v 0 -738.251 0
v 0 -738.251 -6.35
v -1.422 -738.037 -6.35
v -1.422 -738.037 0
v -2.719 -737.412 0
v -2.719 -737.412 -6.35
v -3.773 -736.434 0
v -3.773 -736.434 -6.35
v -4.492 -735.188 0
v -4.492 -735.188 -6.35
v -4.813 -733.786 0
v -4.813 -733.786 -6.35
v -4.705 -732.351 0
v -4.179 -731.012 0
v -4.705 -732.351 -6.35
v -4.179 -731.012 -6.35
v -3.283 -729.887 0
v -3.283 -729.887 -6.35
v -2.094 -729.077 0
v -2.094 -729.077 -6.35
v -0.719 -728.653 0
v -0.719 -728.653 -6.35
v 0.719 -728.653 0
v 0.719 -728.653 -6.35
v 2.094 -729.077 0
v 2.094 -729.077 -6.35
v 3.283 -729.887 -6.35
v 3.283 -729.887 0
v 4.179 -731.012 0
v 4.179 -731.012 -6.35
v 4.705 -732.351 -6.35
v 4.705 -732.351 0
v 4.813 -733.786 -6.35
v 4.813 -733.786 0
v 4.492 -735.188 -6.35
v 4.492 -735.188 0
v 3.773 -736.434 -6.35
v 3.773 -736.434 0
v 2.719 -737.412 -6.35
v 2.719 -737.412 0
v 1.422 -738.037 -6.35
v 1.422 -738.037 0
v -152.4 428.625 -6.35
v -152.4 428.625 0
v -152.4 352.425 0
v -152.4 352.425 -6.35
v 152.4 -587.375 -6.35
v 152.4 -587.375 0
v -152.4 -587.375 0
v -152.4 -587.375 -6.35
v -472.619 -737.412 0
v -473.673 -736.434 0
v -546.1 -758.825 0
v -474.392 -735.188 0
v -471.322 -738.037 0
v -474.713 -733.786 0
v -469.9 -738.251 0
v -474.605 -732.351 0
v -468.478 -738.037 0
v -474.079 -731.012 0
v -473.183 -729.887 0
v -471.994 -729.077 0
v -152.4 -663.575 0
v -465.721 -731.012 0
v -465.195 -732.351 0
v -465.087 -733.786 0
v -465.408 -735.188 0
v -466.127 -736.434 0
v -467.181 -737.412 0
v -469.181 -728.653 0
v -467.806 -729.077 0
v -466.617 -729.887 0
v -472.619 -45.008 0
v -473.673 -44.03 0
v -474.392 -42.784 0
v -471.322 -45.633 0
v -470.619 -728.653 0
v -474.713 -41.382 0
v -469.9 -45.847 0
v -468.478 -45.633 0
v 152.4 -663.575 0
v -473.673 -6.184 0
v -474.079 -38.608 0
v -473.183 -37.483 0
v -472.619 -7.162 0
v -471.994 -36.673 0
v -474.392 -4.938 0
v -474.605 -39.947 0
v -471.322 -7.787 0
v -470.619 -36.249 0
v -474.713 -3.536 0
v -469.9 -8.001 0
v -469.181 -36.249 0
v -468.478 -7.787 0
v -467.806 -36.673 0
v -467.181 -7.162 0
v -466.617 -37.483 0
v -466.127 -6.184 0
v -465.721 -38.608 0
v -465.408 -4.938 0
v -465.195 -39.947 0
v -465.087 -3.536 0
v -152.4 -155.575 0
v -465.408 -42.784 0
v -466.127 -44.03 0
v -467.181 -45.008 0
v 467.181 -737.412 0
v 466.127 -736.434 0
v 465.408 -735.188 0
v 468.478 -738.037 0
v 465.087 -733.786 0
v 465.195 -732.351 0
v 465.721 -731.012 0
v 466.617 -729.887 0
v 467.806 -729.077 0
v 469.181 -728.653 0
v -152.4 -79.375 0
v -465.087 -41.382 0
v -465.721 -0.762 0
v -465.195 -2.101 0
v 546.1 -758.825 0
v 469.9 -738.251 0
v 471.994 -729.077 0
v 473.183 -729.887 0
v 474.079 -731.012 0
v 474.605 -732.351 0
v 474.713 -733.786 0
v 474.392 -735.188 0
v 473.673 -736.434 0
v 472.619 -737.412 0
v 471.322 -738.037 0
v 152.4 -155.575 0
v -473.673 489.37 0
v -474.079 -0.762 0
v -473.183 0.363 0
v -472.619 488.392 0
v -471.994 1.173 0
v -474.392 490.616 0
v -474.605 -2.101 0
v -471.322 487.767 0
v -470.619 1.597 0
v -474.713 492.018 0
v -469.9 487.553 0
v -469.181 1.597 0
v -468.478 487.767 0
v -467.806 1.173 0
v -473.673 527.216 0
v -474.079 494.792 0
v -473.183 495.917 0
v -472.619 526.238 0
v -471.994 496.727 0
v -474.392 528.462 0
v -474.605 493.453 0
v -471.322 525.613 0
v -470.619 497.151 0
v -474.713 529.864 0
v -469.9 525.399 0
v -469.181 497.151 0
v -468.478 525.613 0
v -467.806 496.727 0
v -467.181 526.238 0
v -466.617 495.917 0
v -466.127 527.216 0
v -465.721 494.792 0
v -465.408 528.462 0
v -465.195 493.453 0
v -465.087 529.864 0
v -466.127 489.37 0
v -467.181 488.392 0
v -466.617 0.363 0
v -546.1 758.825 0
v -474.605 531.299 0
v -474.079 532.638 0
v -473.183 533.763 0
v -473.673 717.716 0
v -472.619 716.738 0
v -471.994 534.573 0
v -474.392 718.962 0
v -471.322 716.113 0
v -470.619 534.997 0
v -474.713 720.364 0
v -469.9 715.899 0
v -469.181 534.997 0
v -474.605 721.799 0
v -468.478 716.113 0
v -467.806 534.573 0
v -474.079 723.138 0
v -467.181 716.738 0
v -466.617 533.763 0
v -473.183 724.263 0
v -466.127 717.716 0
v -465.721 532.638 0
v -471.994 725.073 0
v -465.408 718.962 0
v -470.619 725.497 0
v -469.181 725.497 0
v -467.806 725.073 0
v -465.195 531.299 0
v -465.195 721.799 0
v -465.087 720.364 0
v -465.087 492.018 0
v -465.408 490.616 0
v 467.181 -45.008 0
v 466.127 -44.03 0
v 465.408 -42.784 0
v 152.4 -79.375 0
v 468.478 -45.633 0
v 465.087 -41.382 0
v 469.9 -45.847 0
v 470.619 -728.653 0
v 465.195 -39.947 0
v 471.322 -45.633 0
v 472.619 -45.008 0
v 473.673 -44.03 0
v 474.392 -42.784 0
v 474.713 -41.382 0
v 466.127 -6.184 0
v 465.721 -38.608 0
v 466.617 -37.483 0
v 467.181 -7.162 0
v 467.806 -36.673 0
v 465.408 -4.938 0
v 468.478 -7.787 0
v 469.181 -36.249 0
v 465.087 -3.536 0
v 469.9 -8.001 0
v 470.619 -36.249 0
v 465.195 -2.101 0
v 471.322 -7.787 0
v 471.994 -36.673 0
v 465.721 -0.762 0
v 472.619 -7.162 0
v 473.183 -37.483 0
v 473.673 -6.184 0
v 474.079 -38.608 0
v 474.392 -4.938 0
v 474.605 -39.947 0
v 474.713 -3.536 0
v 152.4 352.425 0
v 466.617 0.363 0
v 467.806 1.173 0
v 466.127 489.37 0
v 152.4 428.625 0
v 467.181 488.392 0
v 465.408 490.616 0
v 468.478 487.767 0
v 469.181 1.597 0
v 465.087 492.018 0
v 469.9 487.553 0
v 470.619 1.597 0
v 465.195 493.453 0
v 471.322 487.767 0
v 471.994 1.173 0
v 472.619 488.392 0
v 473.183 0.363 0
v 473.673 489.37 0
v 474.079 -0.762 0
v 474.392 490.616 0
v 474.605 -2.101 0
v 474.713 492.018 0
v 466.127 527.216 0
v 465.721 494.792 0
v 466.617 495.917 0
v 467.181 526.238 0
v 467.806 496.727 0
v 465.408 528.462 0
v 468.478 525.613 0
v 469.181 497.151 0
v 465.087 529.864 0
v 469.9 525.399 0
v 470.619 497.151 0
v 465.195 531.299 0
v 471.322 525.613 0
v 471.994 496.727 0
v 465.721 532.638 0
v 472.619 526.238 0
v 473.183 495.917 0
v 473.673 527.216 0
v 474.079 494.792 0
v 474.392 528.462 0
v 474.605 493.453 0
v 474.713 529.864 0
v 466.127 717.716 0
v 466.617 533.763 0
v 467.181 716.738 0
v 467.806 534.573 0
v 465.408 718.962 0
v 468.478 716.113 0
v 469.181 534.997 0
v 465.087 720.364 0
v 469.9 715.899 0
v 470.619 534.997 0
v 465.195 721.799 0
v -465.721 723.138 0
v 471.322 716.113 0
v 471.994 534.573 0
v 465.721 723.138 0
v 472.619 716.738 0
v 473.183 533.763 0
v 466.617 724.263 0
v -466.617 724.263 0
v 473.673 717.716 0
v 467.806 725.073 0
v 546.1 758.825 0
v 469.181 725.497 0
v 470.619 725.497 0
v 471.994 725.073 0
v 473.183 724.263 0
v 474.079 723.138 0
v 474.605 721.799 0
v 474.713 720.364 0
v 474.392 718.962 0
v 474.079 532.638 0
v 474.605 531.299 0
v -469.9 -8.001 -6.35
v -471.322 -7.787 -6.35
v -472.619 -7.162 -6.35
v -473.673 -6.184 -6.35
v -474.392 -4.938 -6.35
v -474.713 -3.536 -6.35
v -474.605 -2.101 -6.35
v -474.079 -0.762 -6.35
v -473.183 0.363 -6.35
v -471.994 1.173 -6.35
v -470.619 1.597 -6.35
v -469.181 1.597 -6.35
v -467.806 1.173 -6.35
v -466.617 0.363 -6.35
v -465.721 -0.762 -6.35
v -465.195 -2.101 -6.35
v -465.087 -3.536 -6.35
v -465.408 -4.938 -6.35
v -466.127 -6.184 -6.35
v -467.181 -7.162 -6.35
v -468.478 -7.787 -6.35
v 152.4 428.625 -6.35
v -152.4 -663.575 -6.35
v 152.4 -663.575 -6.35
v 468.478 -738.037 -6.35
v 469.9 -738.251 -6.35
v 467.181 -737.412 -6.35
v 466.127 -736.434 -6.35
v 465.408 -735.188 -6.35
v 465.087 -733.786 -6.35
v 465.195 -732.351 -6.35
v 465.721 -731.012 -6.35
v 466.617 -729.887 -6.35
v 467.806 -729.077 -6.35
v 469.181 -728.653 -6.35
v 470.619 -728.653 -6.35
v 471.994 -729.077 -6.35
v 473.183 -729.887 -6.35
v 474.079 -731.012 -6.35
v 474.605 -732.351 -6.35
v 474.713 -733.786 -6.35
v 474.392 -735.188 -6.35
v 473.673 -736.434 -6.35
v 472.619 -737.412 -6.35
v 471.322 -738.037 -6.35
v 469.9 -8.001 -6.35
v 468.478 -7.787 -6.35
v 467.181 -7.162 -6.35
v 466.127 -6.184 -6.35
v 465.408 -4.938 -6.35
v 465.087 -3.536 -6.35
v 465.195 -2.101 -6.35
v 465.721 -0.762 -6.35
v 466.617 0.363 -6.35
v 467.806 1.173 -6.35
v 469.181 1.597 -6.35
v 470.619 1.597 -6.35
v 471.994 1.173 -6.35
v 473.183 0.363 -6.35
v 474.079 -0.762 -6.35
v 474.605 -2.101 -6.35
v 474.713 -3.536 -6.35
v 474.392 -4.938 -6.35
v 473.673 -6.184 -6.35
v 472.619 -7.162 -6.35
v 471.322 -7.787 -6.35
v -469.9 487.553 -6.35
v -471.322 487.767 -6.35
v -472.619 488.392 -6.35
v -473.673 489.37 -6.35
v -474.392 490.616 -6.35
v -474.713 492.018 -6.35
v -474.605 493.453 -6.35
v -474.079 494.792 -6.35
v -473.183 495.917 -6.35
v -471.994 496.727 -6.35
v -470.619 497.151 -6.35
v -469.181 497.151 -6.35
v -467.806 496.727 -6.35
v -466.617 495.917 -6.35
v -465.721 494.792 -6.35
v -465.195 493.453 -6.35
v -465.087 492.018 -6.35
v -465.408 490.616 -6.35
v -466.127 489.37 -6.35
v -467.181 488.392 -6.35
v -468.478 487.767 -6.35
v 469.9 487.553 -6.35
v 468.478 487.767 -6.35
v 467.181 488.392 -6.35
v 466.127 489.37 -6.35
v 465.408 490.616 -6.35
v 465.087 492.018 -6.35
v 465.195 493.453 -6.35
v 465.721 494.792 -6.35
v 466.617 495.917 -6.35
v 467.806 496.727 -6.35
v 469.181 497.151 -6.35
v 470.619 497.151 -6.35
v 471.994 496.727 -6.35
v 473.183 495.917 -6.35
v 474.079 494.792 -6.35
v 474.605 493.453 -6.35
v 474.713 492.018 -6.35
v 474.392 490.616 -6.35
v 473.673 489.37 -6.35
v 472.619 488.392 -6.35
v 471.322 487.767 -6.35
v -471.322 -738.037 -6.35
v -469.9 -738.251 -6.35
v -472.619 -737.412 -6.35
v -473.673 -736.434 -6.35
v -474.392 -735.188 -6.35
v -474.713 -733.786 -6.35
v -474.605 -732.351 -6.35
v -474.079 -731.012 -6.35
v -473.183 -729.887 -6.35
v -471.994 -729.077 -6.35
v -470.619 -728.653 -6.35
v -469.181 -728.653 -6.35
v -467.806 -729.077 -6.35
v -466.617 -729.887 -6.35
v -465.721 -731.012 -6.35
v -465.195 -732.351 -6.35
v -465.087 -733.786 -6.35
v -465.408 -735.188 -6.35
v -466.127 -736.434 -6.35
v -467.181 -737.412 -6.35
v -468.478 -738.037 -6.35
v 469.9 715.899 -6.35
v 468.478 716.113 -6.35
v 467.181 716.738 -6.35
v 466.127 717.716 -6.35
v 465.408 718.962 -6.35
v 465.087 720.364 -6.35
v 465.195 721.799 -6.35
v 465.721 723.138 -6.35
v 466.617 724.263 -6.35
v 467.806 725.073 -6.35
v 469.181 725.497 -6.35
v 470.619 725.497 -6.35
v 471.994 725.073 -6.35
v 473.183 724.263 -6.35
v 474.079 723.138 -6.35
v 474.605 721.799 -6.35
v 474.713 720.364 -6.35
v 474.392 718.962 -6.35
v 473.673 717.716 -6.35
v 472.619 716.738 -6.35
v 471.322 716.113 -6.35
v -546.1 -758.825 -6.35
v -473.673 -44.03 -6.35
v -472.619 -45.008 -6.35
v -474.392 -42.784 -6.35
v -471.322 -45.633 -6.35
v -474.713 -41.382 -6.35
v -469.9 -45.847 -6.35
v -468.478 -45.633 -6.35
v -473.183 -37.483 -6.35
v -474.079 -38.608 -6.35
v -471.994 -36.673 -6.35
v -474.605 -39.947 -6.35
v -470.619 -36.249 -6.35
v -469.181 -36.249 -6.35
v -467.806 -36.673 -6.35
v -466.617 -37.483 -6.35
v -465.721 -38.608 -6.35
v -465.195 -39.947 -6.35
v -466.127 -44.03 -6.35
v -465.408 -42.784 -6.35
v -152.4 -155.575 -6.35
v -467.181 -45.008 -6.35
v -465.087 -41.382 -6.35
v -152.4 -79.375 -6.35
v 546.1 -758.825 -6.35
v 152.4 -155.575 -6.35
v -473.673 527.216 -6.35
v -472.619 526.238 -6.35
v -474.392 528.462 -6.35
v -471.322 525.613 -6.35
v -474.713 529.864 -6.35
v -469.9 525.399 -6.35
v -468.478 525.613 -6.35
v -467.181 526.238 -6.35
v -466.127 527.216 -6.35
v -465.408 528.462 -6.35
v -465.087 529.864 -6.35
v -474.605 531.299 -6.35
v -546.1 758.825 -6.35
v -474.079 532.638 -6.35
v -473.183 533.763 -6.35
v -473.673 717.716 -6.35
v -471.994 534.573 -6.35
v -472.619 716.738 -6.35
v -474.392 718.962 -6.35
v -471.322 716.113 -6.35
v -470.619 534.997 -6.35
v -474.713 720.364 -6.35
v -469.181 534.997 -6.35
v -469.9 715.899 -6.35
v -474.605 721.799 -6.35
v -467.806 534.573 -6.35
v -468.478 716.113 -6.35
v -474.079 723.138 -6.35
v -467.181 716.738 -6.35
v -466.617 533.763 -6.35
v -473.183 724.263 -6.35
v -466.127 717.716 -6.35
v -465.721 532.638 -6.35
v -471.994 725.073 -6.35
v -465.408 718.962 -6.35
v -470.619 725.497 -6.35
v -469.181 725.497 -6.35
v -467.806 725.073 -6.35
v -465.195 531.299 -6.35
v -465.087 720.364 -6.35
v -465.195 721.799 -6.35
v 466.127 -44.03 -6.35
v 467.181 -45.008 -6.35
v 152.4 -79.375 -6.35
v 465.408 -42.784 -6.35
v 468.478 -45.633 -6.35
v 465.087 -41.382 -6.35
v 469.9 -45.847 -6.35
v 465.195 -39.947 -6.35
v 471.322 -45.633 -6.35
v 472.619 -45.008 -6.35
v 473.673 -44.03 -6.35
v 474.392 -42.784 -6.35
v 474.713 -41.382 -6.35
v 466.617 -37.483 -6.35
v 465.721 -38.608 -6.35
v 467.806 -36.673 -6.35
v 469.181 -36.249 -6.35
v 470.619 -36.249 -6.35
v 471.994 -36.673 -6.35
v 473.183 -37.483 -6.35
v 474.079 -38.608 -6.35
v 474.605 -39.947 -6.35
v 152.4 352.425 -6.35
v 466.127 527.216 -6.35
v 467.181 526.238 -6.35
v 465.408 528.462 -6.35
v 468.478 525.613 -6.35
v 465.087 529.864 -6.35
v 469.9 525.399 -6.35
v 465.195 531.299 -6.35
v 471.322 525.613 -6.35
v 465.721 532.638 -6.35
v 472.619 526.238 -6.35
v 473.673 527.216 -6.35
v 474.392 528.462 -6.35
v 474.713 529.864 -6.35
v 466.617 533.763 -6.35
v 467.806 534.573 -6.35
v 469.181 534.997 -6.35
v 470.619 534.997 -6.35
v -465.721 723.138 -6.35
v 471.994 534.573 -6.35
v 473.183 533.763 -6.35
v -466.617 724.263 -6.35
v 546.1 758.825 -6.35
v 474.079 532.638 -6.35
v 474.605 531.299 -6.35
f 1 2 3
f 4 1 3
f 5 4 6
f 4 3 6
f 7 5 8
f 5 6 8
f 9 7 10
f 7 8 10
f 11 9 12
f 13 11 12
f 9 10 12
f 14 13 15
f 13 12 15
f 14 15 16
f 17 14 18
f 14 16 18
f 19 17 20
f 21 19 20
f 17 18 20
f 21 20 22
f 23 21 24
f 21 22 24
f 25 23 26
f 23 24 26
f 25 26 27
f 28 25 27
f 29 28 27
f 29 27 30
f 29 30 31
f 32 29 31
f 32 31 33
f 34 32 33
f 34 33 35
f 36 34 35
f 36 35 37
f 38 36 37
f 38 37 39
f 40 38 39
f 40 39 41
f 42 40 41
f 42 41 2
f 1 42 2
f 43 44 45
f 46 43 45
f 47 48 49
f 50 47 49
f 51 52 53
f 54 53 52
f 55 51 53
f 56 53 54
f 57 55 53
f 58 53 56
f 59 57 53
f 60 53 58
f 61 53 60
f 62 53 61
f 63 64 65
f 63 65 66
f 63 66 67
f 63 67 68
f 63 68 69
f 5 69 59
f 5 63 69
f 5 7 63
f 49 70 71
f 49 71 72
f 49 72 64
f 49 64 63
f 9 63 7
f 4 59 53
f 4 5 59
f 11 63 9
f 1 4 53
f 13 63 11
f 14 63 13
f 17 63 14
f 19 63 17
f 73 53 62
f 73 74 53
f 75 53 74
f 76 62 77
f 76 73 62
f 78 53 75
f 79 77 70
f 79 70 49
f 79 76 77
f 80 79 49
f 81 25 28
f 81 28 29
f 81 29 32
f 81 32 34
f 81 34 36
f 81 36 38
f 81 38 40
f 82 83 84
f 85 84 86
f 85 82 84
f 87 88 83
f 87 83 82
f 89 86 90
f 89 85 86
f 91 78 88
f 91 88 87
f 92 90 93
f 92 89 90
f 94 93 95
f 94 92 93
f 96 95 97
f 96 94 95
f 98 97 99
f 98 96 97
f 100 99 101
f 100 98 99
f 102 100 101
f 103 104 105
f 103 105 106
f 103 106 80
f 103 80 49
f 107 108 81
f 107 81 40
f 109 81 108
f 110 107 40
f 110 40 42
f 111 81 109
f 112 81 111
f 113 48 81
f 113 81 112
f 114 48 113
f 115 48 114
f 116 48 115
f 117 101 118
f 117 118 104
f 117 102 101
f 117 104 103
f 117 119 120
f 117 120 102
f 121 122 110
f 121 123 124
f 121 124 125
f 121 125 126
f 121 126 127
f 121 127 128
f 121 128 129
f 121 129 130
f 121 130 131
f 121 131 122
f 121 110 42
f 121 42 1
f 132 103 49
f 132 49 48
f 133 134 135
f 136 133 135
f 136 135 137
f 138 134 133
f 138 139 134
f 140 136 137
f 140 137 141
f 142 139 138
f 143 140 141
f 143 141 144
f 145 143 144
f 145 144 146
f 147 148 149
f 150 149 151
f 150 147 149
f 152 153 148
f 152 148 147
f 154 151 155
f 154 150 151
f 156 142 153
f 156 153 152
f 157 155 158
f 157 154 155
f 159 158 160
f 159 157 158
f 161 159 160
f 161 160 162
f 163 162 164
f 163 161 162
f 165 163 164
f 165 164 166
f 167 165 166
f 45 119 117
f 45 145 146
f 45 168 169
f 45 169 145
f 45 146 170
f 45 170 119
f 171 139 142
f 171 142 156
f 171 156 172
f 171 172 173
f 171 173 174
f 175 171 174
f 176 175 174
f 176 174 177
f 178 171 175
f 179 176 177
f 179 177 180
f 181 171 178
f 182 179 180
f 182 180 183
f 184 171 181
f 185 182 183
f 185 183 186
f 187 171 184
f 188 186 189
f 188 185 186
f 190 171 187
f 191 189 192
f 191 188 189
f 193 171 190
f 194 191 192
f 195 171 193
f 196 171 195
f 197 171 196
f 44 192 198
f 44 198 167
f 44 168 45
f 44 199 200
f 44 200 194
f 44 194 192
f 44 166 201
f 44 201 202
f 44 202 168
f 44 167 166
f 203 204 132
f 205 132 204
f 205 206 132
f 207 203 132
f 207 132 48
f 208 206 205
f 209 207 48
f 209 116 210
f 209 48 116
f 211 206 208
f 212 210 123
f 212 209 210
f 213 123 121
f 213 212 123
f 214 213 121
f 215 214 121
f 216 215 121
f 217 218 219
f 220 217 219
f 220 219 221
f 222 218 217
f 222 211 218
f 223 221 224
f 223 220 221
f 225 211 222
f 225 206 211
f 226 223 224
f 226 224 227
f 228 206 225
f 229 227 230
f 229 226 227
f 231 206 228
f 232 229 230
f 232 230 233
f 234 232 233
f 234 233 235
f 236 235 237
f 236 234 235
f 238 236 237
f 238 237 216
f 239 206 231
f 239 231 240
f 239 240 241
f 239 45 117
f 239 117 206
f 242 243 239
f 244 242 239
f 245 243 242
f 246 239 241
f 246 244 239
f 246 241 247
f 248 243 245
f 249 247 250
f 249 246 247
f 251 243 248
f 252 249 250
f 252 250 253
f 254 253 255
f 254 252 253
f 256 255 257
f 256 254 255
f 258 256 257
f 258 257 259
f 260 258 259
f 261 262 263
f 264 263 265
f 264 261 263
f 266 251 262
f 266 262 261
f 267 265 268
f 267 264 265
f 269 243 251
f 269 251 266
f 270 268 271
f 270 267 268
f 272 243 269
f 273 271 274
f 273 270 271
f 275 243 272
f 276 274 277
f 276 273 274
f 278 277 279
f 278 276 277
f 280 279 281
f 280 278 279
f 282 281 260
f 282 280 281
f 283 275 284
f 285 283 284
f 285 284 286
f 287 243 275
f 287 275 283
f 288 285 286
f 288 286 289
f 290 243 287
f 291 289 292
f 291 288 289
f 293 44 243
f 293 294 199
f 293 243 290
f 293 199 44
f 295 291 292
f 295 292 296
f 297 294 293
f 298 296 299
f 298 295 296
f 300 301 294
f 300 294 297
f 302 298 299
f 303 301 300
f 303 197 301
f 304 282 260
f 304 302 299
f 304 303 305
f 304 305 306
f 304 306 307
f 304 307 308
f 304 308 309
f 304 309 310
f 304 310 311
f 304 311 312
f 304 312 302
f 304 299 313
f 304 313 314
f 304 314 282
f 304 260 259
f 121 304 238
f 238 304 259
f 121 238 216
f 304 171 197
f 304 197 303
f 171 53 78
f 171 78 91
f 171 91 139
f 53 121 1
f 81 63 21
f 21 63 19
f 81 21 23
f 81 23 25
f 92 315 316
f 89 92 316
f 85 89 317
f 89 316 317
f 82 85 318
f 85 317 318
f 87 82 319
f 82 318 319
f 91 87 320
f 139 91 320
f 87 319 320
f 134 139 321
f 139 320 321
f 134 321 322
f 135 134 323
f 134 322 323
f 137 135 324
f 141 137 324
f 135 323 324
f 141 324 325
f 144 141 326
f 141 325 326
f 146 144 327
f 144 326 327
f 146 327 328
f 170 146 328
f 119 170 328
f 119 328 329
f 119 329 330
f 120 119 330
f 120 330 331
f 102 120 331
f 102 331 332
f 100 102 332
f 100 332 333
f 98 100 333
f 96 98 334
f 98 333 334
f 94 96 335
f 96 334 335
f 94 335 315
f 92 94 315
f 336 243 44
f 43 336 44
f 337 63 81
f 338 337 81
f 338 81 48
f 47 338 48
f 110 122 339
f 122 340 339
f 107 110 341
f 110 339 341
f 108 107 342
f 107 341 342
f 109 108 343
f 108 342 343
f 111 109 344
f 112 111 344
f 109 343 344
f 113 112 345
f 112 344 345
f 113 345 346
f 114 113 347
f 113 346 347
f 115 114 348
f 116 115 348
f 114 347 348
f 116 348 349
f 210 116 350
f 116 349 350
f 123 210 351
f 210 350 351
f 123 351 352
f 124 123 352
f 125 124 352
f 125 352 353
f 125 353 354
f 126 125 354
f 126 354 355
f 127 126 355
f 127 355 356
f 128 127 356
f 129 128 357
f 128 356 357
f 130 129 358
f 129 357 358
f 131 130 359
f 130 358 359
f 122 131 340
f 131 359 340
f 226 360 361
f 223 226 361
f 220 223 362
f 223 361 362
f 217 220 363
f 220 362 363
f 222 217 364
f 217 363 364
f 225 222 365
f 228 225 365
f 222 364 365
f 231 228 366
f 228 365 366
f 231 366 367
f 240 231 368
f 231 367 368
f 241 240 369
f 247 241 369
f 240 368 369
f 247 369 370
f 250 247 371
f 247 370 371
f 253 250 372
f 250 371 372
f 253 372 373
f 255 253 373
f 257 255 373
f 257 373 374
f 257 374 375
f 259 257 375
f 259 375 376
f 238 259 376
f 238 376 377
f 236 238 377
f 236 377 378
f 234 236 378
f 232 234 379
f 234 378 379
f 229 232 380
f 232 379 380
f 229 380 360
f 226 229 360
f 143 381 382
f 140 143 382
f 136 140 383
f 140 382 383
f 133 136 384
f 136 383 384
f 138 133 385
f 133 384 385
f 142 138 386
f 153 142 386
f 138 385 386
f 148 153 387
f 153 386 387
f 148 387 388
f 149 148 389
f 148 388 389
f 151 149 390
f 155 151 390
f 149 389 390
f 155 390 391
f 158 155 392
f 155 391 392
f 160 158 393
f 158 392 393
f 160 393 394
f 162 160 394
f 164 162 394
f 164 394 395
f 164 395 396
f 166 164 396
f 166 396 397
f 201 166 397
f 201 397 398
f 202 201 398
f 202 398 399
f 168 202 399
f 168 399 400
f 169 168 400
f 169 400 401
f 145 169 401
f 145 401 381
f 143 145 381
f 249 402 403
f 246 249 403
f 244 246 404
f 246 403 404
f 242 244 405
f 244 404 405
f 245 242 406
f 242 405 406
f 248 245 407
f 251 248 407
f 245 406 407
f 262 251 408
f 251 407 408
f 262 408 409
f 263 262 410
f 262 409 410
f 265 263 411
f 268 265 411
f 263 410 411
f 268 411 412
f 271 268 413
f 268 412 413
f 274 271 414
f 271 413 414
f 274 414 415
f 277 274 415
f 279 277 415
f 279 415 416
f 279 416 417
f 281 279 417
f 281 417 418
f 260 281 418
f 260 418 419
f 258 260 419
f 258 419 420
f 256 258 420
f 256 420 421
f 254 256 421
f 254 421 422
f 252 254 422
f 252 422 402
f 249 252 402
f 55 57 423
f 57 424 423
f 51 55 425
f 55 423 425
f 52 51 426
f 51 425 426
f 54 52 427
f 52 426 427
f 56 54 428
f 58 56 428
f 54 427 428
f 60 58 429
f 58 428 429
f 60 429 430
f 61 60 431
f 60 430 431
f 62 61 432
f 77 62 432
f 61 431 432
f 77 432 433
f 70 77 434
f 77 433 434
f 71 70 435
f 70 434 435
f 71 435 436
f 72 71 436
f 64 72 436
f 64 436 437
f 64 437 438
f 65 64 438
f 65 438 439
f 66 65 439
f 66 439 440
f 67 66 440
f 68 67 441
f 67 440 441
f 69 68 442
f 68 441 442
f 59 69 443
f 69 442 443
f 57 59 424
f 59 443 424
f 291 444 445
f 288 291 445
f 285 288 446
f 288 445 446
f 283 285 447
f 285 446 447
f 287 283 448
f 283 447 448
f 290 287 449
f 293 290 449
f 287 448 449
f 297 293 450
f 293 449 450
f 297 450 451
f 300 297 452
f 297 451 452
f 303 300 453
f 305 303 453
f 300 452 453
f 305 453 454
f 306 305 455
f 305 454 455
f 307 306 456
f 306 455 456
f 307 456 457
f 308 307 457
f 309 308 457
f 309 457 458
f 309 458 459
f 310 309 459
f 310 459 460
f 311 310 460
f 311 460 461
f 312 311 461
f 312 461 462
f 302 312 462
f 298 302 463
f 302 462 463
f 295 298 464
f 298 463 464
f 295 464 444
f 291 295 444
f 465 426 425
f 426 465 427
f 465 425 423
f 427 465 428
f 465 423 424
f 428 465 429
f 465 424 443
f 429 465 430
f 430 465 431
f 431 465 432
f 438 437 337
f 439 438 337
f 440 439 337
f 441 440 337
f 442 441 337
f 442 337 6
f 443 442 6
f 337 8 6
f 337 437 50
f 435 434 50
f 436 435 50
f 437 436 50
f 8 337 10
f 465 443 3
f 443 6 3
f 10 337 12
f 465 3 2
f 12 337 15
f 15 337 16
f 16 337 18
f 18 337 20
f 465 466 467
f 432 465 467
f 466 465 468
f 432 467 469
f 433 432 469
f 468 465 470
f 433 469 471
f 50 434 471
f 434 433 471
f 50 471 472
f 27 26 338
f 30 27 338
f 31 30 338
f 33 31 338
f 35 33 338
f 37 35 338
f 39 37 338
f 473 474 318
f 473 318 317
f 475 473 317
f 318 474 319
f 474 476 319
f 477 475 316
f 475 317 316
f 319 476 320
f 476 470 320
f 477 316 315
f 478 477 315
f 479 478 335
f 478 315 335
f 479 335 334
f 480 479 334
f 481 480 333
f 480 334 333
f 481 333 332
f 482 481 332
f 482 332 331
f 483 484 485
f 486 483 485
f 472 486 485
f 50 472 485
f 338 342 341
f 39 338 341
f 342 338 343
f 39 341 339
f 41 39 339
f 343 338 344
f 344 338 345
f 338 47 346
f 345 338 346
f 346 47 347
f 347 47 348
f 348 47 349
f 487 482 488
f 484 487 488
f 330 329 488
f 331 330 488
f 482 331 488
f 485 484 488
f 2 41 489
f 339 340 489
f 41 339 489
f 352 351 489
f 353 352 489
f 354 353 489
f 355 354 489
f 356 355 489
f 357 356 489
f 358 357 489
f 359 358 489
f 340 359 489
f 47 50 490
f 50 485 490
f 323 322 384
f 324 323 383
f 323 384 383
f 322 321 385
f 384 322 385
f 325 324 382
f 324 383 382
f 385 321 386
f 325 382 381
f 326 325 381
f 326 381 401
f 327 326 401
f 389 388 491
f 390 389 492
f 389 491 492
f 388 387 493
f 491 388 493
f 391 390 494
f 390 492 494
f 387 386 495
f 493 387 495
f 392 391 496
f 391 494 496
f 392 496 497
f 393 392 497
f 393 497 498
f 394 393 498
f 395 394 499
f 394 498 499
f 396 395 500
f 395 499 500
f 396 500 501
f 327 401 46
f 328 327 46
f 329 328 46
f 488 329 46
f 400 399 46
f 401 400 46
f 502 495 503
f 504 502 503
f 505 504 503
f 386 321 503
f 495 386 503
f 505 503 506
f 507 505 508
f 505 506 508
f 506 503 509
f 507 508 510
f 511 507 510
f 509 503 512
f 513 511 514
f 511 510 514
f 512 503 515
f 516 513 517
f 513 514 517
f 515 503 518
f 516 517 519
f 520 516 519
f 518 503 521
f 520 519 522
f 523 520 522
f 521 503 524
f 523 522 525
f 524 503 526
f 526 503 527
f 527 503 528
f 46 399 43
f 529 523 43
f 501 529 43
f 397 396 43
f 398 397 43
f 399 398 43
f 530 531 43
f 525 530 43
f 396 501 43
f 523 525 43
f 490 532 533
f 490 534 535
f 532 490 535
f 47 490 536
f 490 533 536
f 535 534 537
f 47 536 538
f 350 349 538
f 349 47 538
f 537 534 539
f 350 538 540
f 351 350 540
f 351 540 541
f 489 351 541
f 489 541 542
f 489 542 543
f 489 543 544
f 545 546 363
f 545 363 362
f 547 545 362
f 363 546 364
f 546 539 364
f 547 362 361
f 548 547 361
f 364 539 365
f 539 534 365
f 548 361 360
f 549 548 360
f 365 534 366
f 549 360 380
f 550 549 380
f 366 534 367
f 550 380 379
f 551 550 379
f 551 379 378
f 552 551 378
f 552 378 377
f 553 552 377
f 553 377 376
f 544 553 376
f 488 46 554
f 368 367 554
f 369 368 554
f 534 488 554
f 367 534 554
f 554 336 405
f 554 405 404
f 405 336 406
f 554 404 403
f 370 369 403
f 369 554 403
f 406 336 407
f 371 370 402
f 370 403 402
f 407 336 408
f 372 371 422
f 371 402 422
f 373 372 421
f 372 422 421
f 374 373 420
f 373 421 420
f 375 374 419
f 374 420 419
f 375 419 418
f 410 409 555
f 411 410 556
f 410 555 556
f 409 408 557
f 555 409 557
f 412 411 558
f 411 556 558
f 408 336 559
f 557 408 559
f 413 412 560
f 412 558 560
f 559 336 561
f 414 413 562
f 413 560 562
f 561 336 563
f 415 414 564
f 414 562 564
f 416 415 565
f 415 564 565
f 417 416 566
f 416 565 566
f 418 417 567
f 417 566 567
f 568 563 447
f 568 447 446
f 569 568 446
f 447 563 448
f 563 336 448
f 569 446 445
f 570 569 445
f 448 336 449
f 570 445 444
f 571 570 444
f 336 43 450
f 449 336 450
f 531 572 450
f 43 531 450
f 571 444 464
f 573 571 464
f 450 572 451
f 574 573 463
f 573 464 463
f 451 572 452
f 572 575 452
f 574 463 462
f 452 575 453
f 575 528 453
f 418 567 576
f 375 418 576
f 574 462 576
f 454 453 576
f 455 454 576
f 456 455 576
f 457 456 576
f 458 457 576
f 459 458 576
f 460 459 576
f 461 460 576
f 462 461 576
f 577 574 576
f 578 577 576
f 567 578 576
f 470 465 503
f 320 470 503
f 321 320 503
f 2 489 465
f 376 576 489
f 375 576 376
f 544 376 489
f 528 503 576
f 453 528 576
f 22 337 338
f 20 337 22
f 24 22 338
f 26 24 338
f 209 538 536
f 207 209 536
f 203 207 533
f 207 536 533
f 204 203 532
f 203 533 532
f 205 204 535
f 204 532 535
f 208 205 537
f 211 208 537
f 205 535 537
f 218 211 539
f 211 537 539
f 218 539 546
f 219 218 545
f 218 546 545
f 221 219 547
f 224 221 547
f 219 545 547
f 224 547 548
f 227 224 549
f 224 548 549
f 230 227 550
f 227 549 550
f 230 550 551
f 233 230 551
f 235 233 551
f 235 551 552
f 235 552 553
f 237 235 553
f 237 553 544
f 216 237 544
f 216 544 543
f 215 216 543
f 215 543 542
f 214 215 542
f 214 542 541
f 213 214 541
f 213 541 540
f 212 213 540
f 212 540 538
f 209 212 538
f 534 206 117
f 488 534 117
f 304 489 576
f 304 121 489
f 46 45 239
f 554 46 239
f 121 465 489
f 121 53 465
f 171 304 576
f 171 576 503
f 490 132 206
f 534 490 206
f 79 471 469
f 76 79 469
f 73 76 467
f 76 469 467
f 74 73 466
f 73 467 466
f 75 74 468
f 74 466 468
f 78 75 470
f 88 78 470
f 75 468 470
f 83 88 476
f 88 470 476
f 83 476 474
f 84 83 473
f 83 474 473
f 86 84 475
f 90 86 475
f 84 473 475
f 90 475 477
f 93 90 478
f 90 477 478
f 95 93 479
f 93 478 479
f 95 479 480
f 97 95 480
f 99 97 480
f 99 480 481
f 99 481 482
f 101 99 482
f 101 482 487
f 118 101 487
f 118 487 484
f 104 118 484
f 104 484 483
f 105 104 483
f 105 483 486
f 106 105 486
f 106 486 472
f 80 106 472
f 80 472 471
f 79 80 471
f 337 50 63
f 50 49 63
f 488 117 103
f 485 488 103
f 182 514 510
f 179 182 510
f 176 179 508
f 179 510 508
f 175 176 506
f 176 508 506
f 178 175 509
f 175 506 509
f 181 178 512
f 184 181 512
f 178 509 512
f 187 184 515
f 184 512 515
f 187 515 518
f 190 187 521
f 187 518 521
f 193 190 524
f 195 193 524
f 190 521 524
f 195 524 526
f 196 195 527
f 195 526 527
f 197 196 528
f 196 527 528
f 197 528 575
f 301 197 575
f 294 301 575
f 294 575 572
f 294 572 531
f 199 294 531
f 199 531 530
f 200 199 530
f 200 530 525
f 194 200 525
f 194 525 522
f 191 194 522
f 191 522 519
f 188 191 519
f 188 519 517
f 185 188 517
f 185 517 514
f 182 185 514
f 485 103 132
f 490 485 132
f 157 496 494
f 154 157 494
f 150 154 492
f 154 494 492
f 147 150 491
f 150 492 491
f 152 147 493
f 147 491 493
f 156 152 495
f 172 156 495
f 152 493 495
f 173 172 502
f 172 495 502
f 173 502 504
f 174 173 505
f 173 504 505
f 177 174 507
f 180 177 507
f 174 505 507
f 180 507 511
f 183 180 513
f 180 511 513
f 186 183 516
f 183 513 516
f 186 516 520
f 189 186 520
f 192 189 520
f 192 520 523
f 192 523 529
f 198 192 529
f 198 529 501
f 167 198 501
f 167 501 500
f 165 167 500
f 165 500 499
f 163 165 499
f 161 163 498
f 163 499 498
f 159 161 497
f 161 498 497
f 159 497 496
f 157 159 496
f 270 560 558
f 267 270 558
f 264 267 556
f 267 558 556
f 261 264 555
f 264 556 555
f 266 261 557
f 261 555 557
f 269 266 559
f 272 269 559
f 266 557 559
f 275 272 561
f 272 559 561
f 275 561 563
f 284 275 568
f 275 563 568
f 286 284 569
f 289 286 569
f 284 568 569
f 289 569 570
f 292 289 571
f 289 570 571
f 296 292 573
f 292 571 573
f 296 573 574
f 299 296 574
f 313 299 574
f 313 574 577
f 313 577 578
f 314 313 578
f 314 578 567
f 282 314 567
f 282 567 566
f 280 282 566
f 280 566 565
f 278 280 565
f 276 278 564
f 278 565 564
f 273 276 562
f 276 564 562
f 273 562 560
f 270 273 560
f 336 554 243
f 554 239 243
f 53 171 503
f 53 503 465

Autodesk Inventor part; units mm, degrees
ref_plane "YZ Plane" through (0, 0, 0) normal (1, 0, 0) x (0, 1, 0)
ref_plane "XZ Plane" through (0, 0, 0) normal (0, 1, 0) x (-1, 0, 0)
ref_plane "XY Plane" through (0, 0, 0) normal (0, 0, 1) x (1, 0, 0)
sketch "Sketch1" plane through (0, 0, 0) normal (0, 0, 1) x (1, 0, 0)
  line L0 (-546.1, -758.825) -> (546.1, -758.825)
  line L1 (546.1, -758.825) -> (546.1, 758.825)
  line L2 (546.1, 758.825) -> (-546.1, 758.825)
  line L3 (-546.1, 758.825) -> (-546.1, -758.825)
  line L4 (-546.1, -758.825) -> (546.1, 758.825) construction
  line L5 (546.1, -758.825) -> (-546.1, 758.825) construction
  point P0 (0, 0)
  dimension "d0" = 1092.2
  dimension "d1" = 1517.65
extrude "Extrusion1" add sketch "Sketch1" against normal blind 6.35
sketch "Sketch2" plane through (0, 0, 0) normal (0, 0, 1) x (1, 0, 0)
  line L0 (546.1, 758.825) -> (-546.1, 758.825) projected
  line L1 (-546.1, 758.825) -> (-546.1, -758.825) projected
  line L2 (-152.4, 352.425) -> (152.4, 352.425)
  line L3 (152.4, 352.425) -> (152.4, 428.625)
  line L4 (152.4, 428.625) -> (-152.4, 428.625)
  line L5 (-152.4, 428.625) -> (-152.4, 352.425)
  line L6 (-152.4, -155.575) -> (152.4, -155.575)
  line L7 (152.4, -155.575) -> (152.4, -79.375)
  line L8 (152.4, -79.375) -> (-152.4, -79.375)
  line L9 (-152.4, -79.375) -> (-152.4, -155.575)
  line L10 (-152.4, -663.575) -> (152.4, -663.575)
  line L11 (152.4, -663.575) -> (152.4, -587.375)
  line L12 (152.4, -587.375) -> (-152.4, -587.375)
  line L13 (-152.4, -587.375) -> (-152.4, -663.575)
  point P0 (0, 0)
  dimension "d4" = 330.2
  dimension "d5" = 406.4
  dimension "d6" = 838.2
  dimension "d7" = 914.4
  dimension "d8" = 1346.2
  dimension "d9" = 1422.4
  dimension "d10" = 393.7
  dimension "d11" = 698.5
extrude "Extrusion2" cut sketch "Sketch2" against normal up to next
sketch "Sketch3" plane through (0, 0, 0) normal (0, 0, 1) x (1, 0, 0)
  line L0 (546.1, 758.825) -> (-546.1, 758.825) projected
  line L1 (-546.1, 758.825) -> (-546.1, -758.825) projected
  point P0 (0, 0)
  point P1 (-469.9, 720.725)
  point P2 (-469.9, 530.225)
  point P3 (-469.9, 492.379)
  point P4 (-469.9, -3.175)
  point P5 (-469.9, -41.021)
  point P6 (-469.9, -733.425)
  point P7 (469.9, 720.725)
  point P8 (469.9, 530.225)
  point P9 (469.9, 492.379)
  point P10 (469.9, -3.175)
  point P11 (469.9, -41.021)
  point P12 (469.9, -733.425)
  point P13 (0, -733.425)
  dimension "d14" = 38.1
  dimension "d16" = 1016
  dimension "d17" = 228.6
  dimension "d18" = 266.446
  dimension "d20" = 762
  dimension "d21" = 799.846
  dimension "d22" = 1492.25
  dimension "d23" = 76.2
  dimension "d24" = 1016
  dimension "d32" = 546.1
hole "Hole1" at (-469.9, 720.725, 0) at (-469.9, 530.225, 0) at (-469.9, 492.379, 0) at (-469.9, -3.175, 0) at (-469.9, -41.021, 0) at (-469.9, -733.425, 0) at (469.9, 720.725, 0) at (469.9, 530.225, 0) at (469.9, 492.379, 0) at (469.9, -3.175, 0) at (469.9, -41.021, 0) at (469.9, -733.425, 0) at (0, -733.425, 0) direction (0, 0, -1) diameter 9.652 end through all
properties part number "GE-13010" material "Polycarbonate, Clear"
